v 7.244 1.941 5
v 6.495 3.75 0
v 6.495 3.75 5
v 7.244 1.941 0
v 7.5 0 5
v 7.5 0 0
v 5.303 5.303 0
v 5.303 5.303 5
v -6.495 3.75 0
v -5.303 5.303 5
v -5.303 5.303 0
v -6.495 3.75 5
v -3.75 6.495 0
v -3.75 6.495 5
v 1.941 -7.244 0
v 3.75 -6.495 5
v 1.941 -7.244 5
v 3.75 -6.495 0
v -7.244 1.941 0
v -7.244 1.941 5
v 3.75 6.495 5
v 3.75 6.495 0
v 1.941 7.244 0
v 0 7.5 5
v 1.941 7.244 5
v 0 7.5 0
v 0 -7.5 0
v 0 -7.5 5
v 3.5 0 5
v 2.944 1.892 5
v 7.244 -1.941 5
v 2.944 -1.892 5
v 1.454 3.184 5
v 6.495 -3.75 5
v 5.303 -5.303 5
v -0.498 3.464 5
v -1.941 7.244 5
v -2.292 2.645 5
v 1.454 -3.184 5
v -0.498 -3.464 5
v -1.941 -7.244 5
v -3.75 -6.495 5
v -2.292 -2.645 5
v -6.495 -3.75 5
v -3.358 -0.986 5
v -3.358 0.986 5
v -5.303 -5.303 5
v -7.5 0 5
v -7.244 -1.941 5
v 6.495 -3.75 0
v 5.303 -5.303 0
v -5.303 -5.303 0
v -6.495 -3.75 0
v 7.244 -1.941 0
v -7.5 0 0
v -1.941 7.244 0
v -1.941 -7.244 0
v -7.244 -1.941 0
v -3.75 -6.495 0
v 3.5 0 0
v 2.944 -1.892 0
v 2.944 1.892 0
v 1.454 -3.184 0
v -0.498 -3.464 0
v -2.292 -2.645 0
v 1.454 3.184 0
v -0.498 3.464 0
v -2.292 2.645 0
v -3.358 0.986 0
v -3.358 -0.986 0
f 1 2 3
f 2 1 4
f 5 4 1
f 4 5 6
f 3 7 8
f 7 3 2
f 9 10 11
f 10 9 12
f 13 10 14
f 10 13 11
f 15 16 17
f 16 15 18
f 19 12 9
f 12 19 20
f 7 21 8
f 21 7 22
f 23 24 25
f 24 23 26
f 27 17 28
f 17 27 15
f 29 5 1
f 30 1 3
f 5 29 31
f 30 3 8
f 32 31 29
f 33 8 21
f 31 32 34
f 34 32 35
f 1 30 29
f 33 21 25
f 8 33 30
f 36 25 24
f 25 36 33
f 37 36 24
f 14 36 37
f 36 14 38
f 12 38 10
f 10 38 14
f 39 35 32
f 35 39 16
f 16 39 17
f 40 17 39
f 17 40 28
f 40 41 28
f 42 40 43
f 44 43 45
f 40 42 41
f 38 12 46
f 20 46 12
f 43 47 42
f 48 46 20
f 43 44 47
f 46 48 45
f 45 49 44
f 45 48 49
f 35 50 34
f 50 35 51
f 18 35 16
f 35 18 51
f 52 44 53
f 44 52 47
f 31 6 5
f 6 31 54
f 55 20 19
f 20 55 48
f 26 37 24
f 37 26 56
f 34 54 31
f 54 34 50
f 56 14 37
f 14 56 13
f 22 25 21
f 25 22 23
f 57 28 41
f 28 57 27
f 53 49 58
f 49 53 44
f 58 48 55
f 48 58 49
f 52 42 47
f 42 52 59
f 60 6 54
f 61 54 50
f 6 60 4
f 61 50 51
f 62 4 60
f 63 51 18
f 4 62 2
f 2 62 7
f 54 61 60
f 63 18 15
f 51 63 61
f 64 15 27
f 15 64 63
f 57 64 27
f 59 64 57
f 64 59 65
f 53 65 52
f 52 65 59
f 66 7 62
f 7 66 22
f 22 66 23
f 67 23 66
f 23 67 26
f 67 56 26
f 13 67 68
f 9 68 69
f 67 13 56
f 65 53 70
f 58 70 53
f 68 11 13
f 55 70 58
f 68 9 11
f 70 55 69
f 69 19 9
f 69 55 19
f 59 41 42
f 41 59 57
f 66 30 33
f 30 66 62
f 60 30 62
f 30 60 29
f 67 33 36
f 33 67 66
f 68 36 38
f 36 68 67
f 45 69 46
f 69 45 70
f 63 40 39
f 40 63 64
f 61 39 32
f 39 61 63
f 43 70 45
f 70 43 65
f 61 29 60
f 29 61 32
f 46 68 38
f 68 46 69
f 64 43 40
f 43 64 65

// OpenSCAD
difference() {
  cylinder(r1=7.5, r2=7.5, h=5);
  cylinder(r1=3.5, r2=3.5, h=5);
}
